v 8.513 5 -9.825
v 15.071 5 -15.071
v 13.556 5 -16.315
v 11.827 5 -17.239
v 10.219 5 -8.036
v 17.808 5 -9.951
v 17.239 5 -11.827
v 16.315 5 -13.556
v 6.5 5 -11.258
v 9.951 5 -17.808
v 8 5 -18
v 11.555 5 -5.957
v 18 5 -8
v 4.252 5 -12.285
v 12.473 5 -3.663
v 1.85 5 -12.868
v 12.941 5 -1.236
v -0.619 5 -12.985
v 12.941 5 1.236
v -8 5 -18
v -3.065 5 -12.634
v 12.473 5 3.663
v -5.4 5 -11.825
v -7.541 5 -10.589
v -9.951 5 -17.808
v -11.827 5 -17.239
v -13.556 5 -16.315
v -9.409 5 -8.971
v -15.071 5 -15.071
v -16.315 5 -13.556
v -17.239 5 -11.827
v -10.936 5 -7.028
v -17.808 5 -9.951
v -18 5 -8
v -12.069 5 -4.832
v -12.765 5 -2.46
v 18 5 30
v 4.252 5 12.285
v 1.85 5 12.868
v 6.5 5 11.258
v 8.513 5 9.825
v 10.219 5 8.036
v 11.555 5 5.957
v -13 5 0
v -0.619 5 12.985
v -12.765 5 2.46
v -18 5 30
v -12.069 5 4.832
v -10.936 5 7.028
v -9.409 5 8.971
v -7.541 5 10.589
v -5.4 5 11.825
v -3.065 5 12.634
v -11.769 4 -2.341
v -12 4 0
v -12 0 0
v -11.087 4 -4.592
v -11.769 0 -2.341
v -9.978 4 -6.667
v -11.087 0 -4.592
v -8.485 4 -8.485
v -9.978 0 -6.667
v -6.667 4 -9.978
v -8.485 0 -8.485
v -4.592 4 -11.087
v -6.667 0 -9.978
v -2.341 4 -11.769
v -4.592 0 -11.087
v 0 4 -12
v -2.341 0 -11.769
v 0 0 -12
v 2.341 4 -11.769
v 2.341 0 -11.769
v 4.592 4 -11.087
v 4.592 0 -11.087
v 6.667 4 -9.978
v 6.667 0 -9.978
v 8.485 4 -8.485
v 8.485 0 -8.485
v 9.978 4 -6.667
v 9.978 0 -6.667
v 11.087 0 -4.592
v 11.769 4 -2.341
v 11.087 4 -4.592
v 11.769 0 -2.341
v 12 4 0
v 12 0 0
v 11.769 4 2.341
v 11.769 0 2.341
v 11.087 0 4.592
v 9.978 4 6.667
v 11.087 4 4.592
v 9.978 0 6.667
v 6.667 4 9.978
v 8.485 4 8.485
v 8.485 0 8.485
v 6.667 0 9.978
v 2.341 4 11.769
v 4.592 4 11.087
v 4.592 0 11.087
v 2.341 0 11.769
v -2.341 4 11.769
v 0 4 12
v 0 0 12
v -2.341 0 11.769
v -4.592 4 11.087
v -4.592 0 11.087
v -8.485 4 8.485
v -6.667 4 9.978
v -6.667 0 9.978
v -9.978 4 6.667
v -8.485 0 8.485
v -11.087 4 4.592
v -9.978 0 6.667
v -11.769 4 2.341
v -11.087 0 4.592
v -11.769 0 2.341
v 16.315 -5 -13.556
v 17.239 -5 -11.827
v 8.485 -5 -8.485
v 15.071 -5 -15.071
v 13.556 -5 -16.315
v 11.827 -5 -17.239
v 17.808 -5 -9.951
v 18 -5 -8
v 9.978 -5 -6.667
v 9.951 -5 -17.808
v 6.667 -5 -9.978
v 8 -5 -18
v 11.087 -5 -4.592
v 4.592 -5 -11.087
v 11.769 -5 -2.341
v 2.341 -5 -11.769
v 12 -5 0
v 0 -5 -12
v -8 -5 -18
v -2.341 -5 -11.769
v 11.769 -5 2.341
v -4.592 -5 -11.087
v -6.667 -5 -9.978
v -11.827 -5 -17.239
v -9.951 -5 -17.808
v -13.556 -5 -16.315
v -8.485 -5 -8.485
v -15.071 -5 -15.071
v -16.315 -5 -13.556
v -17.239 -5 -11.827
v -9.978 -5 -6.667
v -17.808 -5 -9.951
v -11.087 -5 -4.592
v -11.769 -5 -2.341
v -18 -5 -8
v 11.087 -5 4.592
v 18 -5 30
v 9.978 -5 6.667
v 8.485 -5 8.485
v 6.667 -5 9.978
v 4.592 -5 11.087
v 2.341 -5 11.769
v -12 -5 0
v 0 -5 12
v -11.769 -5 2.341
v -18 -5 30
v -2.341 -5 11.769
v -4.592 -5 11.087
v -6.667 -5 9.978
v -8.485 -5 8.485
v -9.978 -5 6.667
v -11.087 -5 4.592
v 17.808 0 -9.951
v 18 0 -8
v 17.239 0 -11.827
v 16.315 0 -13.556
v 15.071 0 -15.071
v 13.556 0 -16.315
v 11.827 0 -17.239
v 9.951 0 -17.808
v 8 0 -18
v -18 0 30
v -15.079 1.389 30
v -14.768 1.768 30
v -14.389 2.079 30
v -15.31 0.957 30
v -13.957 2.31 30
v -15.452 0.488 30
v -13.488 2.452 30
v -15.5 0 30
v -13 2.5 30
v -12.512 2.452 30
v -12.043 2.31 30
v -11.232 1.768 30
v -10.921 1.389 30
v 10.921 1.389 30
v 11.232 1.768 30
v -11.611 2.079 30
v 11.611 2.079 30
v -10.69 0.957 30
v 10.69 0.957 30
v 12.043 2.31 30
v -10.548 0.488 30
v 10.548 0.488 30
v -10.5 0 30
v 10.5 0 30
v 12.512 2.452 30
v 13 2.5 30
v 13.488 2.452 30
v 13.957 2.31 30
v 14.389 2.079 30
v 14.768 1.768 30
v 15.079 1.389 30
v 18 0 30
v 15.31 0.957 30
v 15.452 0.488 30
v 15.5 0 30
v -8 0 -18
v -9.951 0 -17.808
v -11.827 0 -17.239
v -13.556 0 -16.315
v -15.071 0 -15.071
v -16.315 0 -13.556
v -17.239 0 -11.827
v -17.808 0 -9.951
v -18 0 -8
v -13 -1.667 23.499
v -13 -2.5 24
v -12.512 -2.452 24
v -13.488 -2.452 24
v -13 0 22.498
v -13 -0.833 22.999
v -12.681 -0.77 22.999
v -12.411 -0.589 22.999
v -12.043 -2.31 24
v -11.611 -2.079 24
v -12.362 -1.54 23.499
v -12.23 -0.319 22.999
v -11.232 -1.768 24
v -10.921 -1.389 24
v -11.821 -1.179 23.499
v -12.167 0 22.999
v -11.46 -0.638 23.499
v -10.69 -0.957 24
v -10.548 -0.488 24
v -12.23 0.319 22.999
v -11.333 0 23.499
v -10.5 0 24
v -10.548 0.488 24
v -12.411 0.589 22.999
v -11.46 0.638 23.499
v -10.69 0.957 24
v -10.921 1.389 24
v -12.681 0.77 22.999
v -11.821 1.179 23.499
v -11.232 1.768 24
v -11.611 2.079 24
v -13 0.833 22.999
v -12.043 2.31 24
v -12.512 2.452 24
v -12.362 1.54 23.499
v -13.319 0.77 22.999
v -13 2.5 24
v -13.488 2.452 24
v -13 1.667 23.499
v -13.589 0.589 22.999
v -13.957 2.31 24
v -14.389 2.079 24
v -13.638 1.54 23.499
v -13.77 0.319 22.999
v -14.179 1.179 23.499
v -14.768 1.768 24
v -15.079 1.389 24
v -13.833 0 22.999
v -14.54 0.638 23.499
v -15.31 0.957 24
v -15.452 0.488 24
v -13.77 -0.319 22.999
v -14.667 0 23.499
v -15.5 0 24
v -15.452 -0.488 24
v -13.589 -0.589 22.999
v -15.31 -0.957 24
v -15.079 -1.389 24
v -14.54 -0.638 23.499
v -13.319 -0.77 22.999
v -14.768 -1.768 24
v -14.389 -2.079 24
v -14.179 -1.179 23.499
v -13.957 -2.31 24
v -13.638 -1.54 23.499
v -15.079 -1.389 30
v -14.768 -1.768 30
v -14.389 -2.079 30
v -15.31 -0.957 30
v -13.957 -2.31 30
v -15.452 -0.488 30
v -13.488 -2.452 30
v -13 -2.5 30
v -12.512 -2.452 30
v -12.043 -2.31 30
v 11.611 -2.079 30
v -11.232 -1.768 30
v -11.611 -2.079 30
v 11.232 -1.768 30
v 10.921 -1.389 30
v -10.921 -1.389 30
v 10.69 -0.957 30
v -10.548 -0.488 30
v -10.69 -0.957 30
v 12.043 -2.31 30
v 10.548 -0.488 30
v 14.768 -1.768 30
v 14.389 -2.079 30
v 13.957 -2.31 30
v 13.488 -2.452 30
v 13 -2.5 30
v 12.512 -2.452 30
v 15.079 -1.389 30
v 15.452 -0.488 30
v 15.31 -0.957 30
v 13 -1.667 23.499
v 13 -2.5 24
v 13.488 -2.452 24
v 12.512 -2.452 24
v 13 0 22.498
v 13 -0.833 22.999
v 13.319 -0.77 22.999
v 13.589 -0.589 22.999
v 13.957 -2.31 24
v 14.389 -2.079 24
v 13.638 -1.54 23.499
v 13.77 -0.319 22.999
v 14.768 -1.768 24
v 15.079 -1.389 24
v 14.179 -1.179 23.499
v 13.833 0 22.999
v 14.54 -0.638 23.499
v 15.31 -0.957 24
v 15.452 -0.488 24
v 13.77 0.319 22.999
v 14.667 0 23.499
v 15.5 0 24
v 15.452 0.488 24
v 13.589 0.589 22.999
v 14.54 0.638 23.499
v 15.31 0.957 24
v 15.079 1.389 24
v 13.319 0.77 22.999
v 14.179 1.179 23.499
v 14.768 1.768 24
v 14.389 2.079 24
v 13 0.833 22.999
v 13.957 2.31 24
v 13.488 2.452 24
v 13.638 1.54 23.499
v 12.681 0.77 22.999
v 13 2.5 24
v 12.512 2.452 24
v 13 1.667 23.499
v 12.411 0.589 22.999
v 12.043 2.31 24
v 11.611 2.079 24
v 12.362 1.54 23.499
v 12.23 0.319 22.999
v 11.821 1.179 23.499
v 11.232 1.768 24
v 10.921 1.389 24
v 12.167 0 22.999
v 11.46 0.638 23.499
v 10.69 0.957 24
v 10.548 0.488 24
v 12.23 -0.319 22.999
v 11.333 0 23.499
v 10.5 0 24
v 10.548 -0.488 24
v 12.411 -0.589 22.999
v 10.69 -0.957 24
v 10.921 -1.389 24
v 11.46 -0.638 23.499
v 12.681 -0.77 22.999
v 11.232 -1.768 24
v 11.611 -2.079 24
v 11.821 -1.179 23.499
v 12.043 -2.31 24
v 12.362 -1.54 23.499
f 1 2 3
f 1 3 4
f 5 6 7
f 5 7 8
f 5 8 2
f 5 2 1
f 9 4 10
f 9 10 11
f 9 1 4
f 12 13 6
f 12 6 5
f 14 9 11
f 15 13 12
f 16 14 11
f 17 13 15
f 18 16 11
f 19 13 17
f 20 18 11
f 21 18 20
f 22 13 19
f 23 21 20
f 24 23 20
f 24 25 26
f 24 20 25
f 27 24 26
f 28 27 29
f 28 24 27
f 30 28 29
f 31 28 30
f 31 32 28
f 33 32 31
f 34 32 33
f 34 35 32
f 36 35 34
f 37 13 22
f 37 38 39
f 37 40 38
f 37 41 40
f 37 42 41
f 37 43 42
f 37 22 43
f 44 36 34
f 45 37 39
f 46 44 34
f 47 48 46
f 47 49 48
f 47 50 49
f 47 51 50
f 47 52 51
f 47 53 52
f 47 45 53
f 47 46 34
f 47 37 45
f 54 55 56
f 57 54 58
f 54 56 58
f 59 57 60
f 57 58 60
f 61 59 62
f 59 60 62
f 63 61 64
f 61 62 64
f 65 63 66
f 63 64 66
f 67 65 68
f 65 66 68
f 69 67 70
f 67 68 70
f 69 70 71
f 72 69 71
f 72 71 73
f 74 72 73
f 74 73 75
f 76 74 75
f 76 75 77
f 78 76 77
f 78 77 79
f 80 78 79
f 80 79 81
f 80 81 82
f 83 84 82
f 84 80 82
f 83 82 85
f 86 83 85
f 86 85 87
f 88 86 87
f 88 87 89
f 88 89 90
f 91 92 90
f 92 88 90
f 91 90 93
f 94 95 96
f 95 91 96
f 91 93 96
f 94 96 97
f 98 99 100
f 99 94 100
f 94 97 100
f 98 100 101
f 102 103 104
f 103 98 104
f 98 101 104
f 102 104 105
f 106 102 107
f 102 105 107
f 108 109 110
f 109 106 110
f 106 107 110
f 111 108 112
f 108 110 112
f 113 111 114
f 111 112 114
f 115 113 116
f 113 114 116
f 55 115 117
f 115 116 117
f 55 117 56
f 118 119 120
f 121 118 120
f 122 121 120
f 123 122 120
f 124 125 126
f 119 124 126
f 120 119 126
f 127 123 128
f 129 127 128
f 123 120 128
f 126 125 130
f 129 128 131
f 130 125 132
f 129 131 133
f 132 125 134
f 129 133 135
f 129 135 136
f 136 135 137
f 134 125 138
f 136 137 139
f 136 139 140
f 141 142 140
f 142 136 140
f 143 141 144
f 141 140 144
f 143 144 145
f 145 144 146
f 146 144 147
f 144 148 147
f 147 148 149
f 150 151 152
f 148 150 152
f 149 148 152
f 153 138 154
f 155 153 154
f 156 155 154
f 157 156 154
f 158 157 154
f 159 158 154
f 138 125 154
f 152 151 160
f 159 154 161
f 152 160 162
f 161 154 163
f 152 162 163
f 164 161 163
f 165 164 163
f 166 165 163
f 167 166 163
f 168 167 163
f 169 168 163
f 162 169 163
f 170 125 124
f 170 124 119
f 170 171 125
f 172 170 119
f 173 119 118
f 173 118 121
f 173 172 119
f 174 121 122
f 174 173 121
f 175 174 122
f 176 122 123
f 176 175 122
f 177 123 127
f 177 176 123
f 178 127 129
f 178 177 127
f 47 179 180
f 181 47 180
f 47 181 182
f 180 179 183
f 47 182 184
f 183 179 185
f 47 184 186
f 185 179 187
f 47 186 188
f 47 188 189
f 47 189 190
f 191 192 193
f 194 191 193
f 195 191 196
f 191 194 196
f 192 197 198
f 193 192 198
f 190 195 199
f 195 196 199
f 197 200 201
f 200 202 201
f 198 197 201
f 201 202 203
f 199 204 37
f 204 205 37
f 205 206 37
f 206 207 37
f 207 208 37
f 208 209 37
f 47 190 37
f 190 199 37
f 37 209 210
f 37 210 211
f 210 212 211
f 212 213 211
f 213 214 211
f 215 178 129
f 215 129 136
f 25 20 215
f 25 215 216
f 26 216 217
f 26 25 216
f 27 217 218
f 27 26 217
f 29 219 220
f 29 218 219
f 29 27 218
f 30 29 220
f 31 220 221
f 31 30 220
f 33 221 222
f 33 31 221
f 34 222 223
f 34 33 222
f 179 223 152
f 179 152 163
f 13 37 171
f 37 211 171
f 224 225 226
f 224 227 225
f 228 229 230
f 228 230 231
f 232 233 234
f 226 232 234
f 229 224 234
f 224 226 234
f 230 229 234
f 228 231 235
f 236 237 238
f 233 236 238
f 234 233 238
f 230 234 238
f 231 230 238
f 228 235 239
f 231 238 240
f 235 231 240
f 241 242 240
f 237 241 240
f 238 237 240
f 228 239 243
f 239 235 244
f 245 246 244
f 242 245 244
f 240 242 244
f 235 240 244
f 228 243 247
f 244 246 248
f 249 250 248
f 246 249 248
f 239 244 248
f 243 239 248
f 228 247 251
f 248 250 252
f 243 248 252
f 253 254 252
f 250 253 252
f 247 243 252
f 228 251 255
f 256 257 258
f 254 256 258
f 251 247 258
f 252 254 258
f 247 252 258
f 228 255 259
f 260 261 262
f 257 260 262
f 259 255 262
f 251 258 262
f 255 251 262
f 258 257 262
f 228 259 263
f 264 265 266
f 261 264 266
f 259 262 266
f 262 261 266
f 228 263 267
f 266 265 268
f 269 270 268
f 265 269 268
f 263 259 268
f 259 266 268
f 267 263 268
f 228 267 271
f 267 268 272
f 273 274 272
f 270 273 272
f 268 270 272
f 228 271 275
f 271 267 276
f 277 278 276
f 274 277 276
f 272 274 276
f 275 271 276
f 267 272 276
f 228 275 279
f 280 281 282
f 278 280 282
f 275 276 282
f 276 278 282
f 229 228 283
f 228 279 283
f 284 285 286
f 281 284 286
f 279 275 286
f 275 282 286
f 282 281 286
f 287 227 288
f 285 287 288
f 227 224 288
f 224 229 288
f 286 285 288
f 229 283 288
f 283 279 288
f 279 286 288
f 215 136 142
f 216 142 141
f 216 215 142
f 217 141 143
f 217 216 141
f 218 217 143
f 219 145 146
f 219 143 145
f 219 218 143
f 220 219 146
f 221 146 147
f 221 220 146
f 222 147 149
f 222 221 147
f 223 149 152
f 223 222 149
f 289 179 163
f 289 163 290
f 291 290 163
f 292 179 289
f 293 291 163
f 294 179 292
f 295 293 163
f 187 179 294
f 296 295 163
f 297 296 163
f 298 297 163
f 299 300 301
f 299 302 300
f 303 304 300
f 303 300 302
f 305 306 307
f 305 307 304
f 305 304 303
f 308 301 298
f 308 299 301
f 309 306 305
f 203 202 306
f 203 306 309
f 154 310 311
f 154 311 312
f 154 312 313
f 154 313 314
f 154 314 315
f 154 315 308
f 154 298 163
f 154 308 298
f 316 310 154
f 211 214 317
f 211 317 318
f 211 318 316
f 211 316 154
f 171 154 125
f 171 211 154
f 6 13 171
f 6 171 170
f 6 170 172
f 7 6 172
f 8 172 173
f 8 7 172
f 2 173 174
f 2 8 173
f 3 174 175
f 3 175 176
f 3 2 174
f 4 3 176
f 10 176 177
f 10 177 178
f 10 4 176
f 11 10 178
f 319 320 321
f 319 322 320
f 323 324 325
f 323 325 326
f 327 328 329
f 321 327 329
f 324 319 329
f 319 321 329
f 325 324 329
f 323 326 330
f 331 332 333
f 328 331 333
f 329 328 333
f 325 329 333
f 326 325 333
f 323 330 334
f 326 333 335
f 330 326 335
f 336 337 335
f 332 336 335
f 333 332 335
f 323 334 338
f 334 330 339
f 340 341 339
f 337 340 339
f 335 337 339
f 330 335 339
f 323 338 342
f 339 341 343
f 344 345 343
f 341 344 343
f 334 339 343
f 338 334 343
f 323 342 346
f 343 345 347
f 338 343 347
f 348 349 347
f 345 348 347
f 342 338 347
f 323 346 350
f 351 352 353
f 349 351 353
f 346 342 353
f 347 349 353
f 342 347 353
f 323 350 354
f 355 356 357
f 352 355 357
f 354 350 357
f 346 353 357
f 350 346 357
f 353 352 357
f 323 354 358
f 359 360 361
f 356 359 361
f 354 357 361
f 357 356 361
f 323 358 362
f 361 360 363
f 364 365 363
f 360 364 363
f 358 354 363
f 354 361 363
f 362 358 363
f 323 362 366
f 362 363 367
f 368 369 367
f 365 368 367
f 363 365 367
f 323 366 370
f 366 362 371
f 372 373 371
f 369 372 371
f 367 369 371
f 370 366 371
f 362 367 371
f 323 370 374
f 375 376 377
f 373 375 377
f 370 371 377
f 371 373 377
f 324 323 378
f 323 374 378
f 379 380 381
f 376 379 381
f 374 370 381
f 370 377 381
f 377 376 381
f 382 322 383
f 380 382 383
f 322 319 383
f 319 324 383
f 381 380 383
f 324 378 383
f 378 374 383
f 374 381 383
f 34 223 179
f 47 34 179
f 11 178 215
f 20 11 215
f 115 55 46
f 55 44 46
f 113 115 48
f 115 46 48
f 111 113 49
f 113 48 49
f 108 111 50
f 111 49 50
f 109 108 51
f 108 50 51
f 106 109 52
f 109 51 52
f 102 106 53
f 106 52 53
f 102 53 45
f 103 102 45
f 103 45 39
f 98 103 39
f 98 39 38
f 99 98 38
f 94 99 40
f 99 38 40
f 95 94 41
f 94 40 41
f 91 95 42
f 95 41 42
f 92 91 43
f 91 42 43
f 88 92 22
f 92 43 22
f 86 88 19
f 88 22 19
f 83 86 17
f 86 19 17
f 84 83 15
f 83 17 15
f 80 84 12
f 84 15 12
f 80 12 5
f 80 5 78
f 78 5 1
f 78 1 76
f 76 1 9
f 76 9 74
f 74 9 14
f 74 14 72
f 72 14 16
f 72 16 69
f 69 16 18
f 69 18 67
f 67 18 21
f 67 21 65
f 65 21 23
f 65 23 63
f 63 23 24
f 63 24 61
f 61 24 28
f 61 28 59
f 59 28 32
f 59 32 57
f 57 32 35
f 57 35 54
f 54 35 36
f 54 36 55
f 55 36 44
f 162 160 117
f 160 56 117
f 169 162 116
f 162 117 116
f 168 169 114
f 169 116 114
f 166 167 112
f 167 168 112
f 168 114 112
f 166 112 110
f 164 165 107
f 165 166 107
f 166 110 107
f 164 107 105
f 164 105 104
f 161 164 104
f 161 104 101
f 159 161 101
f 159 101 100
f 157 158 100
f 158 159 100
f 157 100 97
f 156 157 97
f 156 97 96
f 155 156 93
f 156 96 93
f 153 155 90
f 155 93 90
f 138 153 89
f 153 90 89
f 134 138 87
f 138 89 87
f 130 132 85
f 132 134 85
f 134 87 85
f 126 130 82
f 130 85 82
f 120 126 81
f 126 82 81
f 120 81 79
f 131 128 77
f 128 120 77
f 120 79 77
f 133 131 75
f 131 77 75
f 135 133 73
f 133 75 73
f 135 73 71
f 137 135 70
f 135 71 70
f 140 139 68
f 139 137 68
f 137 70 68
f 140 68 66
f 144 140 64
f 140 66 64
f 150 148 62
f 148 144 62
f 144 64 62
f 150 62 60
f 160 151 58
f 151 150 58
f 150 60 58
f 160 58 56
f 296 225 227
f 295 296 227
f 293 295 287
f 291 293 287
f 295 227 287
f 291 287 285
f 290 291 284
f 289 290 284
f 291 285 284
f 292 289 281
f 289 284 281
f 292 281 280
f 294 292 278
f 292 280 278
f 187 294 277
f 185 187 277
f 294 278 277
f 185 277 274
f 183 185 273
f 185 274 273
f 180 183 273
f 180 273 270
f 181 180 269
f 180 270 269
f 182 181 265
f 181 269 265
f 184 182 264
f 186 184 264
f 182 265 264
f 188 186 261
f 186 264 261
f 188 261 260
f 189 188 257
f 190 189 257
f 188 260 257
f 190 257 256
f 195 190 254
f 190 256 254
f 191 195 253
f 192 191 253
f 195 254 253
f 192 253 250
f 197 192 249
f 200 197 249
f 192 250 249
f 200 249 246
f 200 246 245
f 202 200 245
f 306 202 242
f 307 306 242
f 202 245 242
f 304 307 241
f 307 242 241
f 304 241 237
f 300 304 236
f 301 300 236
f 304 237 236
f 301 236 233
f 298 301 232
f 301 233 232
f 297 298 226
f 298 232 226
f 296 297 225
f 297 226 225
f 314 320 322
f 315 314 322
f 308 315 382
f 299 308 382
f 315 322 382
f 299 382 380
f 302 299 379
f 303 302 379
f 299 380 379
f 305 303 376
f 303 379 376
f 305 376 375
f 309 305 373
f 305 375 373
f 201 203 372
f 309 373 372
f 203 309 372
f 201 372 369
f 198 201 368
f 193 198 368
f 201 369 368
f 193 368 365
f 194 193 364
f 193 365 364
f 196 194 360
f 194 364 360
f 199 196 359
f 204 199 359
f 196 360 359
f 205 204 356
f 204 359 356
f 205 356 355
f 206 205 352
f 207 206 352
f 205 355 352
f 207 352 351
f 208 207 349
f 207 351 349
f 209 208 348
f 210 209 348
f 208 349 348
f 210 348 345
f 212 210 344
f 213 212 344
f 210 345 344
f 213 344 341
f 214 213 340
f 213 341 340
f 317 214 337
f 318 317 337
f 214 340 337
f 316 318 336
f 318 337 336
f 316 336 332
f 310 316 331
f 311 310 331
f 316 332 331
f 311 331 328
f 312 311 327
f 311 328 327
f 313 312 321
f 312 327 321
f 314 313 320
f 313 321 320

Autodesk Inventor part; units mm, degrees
ref_plane "YZ Plane" through (0, 0, 0) normal (1, 0, 0) x (0, 1, 0)
ref_plane "XZ Plane" through (0, 0, 0) normal (0, 1, 0) x (-1, 0, 0)
ref_plane "XY Plane" through (0, 0, 0) normal (0, 0, 1) x (1, 0, 0)
sketch "スケッチ1" plane through (0, 0, 0) normal (0, 1, 0) x (-1, 0, 0)
  circle A0 centre (0, 0) radius 12
  line L0 (18, 10) -> (-18, 10)
  line L1 (-18, 10) -> (-18, -18)
  line L2 (-18, -18) -> (18, -18)
  line L3 (18, -18) -> (18, 10)
  line L4 (18, 30) -> (-18, 30)
  line L5 (-18, 30) -> (-18, 10)
  line L6 (-18, 10) -> (18, 10)
  line L7 (18, 10) -> (18, 30)
  line L8 (18, 30) -> (-18, 10) construction
  line L9 (-18, 30) -> (18, 10) construction
  point P0 (0, 20)
  point P1 (0, 20)
  point P2 (20, 10)
  point P3 (-6.6332, 10)
  point P4 (6.6332, 10)
  dimension "d0" = 24
  dimension "d18" = 10
  dimension "d33" = 30
  dimension "d34" = 36
  dimension "d36" = 18
extrude "押し出し1" add sketch "スケッチ1" along normal mid plane 10 contours A0 L0 L3 L2 L1 | A0 L0 L5 L4 L7
sketch "スケッチ2" plane through (-38, 5, 30) normal (0, 0, 1) x (1, 0, 0)
  line L0 (20, -10) -> (20, 0) projected
  line L1 (56, -10) -> (20, -10) projected
  line L2 (56, 0) -> (56, -10) projected
  point P0 (38, -5)
  point P1 (25, -5)
  point P2 (51, -5)
  dimension "d37" = 5
  dimension "d38" = 5
  dimension "d39" = 5
hole "穴1" at (-13, 0, 30) at (13, 0, 30) direction (0, 0, -1) diameter 5 depth 6 tip angle 118
fillet "フィレット1" radius 10 4 edges at (18, 2.5, -18) (18, -2.5, -18) (-18, 2.5, -18) (-18, -2.5, -18)
chamfer "面取り1" distance 1 angle 45 2 edges at (5.6745, 5, -10.5735) (0, 5, 12)
properties part number "cable_holder" material "ABS プラスチック"
